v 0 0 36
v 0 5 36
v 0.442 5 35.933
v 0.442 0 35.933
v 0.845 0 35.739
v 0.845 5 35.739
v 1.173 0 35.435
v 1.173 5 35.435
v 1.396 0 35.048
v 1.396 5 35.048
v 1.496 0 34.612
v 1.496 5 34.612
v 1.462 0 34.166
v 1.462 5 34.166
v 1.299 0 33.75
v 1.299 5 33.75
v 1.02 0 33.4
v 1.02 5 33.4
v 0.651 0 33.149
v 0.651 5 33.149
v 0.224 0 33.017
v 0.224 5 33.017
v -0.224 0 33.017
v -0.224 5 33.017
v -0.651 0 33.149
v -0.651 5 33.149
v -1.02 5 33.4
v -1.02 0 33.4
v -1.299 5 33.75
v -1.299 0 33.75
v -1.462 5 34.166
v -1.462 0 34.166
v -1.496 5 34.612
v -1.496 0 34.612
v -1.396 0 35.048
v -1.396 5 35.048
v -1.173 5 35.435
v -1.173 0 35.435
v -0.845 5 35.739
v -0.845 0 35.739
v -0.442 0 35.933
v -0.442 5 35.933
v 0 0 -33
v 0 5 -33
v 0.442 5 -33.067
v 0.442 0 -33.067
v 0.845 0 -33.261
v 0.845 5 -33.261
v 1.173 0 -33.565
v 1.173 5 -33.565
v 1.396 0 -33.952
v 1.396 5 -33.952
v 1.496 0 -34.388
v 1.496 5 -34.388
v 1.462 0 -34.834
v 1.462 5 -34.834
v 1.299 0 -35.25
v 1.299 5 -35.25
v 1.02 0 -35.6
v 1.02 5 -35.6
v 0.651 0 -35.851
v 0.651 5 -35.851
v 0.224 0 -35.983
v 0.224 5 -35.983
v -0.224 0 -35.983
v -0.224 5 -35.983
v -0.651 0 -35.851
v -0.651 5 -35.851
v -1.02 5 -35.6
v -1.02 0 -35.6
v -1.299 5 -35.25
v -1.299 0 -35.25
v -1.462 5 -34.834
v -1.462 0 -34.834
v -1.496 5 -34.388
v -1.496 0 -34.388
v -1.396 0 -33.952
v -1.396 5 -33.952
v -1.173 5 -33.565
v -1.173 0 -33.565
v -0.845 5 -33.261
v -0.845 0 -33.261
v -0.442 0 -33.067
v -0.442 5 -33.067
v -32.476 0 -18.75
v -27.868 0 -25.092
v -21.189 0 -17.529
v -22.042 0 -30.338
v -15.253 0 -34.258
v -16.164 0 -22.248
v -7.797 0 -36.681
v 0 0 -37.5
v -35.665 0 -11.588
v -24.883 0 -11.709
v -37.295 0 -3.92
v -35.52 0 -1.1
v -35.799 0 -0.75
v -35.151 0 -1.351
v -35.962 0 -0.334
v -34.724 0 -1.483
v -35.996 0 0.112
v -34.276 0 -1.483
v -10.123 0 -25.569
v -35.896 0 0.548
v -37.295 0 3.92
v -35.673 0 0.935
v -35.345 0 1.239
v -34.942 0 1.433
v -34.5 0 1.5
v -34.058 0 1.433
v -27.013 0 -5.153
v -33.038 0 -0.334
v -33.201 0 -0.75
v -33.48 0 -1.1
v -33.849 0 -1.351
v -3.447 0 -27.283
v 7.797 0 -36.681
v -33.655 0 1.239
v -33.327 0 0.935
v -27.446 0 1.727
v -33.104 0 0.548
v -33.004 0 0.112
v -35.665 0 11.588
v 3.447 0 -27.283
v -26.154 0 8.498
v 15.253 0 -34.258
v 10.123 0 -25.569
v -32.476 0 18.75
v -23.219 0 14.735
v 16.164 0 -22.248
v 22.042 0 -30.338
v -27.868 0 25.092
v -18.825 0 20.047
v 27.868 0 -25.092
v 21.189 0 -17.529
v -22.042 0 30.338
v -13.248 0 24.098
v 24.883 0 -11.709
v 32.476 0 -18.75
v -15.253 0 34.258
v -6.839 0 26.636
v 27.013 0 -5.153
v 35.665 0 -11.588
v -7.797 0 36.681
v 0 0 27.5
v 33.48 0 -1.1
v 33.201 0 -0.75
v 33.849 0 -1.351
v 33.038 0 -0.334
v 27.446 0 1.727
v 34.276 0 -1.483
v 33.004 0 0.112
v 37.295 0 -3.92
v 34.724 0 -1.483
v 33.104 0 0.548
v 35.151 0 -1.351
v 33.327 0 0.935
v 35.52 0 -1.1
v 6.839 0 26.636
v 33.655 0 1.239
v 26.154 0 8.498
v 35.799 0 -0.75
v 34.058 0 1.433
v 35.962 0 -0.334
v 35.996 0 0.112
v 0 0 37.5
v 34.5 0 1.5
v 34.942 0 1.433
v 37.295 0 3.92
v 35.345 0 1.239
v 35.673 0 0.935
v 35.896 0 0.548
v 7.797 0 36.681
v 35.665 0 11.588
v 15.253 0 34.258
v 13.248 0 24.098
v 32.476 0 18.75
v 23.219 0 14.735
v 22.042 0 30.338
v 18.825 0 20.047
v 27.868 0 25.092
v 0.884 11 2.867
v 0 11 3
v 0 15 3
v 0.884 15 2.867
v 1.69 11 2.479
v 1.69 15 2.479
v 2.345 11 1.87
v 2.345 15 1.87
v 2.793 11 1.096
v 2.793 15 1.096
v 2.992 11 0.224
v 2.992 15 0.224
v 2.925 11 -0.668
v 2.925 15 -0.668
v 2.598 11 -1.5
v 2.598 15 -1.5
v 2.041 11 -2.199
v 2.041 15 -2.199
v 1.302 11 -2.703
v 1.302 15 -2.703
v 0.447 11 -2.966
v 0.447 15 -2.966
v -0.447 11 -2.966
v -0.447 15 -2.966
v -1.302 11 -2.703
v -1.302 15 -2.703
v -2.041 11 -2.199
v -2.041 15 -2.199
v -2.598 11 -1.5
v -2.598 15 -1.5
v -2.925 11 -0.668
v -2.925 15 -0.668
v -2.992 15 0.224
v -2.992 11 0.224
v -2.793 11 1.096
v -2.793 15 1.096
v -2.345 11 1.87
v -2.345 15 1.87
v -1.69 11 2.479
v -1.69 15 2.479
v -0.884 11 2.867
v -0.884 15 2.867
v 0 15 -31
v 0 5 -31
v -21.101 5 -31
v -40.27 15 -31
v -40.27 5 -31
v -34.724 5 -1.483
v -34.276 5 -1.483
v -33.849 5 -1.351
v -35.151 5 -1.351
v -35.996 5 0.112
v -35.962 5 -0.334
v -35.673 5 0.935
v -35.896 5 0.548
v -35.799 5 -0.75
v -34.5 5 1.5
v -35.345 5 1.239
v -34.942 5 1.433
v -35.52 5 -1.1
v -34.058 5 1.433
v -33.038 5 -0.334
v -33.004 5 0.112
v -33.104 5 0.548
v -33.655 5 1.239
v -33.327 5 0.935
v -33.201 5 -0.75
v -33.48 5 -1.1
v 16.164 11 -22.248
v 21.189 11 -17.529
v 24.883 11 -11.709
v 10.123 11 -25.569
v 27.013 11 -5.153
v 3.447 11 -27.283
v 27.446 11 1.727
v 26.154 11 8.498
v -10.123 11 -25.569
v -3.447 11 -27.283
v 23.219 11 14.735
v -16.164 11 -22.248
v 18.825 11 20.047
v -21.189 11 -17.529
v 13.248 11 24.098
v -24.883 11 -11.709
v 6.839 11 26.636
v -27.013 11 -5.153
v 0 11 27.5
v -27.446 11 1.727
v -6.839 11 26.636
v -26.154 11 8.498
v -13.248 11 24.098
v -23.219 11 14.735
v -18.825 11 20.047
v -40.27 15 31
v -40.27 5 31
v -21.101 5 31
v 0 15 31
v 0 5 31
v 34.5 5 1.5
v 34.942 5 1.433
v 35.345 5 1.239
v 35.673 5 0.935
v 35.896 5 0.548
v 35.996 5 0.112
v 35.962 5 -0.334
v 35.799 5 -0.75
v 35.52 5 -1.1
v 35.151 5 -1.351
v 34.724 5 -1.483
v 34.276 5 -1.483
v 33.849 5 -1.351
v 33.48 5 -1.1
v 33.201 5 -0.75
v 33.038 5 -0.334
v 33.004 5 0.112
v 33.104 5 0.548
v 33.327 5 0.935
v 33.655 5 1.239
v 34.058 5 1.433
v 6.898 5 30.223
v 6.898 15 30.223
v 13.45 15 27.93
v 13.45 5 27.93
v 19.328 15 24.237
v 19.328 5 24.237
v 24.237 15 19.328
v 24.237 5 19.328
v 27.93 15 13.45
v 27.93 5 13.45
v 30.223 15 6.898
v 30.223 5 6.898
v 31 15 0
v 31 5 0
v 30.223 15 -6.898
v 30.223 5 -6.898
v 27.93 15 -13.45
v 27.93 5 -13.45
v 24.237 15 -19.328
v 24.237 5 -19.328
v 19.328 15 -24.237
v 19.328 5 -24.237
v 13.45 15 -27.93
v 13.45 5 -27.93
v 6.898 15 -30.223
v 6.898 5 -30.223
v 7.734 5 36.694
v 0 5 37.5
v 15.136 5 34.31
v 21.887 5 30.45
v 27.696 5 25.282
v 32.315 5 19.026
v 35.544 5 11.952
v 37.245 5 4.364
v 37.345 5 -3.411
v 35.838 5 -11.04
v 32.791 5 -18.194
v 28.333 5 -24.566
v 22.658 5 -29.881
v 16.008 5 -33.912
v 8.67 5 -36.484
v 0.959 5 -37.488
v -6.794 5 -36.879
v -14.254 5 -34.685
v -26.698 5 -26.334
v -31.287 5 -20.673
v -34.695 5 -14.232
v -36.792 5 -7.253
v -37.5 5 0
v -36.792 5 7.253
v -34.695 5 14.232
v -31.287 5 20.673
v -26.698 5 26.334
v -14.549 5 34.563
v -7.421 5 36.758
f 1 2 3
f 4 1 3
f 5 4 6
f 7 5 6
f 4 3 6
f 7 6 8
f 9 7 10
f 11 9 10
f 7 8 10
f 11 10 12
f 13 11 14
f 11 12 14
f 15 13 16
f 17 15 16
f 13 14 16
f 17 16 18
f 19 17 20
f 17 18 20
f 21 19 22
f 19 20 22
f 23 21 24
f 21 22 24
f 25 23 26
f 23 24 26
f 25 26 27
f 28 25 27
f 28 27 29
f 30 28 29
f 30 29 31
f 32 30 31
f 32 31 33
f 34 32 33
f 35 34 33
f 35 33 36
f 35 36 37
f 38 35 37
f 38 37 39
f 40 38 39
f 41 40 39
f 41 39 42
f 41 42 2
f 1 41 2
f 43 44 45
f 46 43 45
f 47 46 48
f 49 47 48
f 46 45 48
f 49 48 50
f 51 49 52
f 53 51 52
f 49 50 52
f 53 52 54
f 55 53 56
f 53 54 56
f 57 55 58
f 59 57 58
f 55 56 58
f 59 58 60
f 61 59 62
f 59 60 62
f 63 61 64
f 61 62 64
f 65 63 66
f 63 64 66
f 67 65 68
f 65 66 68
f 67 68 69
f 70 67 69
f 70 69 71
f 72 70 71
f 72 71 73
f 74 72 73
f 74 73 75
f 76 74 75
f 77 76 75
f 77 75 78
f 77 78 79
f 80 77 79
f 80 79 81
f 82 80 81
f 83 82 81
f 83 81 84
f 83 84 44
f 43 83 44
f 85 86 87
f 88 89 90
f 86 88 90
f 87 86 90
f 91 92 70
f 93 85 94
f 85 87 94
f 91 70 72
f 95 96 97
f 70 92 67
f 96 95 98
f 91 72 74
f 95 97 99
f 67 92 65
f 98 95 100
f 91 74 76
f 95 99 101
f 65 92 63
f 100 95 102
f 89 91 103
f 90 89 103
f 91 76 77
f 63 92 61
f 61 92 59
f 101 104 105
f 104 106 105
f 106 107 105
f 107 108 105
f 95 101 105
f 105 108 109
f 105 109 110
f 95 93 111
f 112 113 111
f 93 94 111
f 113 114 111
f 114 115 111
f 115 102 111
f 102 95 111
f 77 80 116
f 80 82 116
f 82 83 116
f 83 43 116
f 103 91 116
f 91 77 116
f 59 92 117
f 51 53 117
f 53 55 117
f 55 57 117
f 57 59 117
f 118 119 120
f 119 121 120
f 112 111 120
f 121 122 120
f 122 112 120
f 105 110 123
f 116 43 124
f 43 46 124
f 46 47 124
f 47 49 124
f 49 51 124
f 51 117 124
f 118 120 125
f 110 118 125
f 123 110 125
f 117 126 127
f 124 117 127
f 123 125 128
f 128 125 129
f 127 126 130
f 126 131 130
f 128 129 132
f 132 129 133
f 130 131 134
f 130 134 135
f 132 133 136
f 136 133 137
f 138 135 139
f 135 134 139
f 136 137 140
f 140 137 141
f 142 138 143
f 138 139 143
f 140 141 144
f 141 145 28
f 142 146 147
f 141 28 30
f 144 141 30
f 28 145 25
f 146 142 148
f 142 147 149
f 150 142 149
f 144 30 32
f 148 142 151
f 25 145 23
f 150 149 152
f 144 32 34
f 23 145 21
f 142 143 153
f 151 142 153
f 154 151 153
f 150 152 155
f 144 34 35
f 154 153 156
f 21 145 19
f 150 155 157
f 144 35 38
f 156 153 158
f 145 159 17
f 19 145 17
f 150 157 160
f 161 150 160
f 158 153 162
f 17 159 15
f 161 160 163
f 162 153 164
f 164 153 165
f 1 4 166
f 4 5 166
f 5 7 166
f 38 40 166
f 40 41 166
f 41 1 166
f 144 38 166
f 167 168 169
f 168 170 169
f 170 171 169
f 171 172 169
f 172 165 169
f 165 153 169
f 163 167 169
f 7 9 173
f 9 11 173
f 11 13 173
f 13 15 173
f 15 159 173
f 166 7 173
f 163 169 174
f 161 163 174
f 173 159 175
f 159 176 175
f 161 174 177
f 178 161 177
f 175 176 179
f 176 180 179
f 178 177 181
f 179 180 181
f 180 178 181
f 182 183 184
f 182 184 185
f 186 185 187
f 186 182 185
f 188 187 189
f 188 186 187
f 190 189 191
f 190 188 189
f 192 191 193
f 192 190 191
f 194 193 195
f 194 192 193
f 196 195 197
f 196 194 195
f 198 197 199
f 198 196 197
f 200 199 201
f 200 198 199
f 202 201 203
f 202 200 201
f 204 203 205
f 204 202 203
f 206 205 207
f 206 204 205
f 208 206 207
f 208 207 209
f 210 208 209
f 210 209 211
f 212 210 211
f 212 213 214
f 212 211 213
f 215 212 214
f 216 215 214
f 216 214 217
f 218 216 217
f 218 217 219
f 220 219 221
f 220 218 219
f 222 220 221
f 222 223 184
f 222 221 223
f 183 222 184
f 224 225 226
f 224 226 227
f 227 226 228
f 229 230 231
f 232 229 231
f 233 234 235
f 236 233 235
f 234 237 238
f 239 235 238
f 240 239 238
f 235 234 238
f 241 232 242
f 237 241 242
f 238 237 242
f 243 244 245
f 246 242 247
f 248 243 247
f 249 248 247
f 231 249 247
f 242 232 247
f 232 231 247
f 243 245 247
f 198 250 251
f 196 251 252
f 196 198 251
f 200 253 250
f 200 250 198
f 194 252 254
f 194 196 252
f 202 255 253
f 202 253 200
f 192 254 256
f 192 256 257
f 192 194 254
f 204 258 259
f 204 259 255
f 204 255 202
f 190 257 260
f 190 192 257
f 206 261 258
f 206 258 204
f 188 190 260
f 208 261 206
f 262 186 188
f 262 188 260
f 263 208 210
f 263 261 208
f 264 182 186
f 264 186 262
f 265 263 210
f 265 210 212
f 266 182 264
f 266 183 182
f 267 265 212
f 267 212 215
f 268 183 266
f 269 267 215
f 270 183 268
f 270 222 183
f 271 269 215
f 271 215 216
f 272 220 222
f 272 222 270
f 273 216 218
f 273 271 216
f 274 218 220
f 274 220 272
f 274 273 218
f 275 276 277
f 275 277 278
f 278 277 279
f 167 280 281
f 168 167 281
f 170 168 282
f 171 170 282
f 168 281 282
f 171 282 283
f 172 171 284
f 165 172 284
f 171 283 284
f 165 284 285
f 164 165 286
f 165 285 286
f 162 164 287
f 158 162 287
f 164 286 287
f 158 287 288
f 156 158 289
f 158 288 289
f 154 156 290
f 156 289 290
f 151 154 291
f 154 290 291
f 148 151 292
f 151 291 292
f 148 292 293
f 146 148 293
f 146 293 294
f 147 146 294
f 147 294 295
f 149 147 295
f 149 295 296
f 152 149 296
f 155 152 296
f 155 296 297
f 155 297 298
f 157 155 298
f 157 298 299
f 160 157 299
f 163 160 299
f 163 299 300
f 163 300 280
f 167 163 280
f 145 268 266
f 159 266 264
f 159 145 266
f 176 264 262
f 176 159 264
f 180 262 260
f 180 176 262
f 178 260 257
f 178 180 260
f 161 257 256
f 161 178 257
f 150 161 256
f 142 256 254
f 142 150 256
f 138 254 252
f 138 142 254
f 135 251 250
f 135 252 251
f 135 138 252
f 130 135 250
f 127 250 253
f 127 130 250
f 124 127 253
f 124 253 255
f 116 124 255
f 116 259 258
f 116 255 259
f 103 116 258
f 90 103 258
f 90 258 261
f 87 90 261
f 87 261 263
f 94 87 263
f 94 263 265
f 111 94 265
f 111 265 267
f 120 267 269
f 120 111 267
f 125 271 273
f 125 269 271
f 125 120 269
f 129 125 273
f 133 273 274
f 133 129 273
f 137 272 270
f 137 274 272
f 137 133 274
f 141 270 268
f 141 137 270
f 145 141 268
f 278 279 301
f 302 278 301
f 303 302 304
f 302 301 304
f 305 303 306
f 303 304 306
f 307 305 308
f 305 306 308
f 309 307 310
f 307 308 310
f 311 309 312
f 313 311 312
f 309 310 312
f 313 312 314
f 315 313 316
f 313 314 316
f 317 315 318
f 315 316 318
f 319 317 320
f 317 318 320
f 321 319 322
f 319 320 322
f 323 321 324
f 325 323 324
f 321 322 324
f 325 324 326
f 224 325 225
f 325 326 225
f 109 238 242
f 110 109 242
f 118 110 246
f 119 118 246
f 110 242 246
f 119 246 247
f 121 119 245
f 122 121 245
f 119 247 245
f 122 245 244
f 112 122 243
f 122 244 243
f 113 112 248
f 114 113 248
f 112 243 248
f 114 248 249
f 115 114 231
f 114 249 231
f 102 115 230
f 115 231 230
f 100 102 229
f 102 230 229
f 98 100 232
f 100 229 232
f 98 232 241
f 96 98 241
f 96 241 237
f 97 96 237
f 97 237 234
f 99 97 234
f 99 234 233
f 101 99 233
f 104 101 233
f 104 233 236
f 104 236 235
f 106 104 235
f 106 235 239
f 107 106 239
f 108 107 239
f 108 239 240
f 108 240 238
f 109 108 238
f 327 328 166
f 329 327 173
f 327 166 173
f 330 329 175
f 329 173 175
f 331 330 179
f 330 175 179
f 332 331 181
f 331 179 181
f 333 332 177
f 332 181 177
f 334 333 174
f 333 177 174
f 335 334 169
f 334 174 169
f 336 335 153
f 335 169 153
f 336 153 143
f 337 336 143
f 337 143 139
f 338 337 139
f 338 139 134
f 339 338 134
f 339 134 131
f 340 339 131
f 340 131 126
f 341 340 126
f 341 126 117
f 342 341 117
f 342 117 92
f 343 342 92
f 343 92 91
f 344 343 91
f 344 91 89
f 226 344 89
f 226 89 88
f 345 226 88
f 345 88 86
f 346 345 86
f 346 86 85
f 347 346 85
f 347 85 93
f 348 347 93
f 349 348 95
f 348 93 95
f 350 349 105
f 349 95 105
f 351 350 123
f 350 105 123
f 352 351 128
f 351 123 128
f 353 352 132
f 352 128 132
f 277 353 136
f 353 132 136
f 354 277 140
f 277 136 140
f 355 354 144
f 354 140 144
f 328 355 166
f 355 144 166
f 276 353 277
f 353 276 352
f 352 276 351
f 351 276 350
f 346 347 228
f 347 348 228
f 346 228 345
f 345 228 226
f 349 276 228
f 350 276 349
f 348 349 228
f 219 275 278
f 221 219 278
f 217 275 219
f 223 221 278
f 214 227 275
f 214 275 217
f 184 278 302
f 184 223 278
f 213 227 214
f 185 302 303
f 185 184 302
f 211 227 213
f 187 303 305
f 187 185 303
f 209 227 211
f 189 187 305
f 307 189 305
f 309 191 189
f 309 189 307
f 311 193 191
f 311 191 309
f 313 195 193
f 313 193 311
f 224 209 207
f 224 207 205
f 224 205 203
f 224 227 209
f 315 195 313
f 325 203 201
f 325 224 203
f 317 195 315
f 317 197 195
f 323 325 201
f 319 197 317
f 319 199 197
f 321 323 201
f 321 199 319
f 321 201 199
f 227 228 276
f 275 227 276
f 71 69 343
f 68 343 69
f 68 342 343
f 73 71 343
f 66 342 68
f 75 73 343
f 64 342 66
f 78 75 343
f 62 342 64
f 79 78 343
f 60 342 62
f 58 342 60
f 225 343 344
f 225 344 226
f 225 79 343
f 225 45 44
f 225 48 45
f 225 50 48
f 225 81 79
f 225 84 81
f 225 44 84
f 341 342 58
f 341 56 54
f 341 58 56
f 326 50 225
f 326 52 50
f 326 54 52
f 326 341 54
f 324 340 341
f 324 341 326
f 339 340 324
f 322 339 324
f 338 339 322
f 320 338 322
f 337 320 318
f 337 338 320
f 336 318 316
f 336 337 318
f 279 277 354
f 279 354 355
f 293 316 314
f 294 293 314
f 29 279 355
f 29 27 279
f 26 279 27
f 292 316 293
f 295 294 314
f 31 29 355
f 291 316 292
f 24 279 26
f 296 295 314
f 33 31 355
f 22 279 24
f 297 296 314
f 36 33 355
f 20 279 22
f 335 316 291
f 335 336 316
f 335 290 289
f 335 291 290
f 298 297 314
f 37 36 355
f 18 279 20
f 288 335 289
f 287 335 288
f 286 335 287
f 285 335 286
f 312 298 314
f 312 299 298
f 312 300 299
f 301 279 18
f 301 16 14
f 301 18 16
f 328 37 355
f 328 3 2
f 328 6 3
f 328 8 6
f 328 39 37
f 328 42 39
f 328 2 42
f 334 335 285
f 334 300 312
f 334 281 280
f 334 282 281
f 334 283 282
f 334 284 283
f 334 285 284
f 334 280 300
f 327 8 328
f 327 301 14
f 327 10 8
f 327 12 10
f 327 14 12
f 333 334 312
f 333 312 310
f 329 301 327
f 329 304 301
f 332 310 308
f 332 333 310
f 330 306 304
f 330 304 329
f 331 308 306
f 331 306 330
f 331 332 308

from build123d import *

# Parameters (mm, degrees)
SKETCH1_R               = 37.5
SKETCH1_R_2             = 27.5
BOSS_EXTRUDE1_DEPTH     = 5
BOSS_EXTRUDE2_DEPTH     = 10
SKETCH3_R               = 27.5
CUT_EXTRUDE2_DEPTH      = 6
CUT_EXTRUDE3_DEPTH      = 58.034295486
CUT_EXTRUDE3_DEPTH_BACK = 58.034295486
SKETCH4_R               = 3
SKETCH5_R               = 1.5
CUT_EXTRUDE4_DEPTH      = 56.927728914


with BuildPart() as part:
    # Sketch1 → Boss-Extrude1 (new body)
    with BuildSketch(Plane(origin=(0, 0, 0), x_dir=(1, 0, 0), z_dir=(0, 1, 0))):
        with Locations(Location((0, 0, 0), (0, 0, 270))):
            Circle(SKETCH1_R)
        with Locations(Location((0, 0, 0), (0, 0, 270))):
            Circle(SKETCH1_R_2, mode=Mode.SUBTRACT)
    extrude(amount=BOSS_EXTRUDE1_DEPTH)

    # Sketch2 → Boss-Extrude2 (add)
    with BuildSketch(Plane(origin=(0, 5, 0), x_dir=(1, 0, 0), z_dir=(0, 1, 0))):
        with BuildLine():
            Line((0, 31), (-40.269850528, 31))
            Line((-40.269850528, 31), (-40.269850528, -31))
            Line((-40.269850528, -31), (0, -31))
            ThreePointArc((0, -31), (31, 0), (0, 31))
        make_face()
    extrude(amount=BOSS_EXTRUDE2_DEPTH)

    # Sketch3 → Cut-Extrude2 (cut)
    with BuildSketch(Plane.XZ.offset(-5)):
        with Locations(Location((0, 0, 0), (0, 0, 90))):
            Circle(SKETCH3_R)
    extrude(amount=-CUT_EXTRUDE2_DEPTH, mode=Mode.SUBTRACT)

    # Sketch4 → Cut-Extrude3 (cut, two sides: drawn at the far end of the back side and taken through both)
    with BuildSketch(Plane(origin=(0, 15, 0), x_dir=(1, 0, 0), z_dir=(0, 1, 0)).offset(-CUT_EXTRUDE3_DEPTH_BACK)):
        with Locations(Location((0, 0, 0), (0, 0, 270))):
            Circle(SKETCH4_R)
    extrude(amount=CUT_EXTRUDE3_DEPTH + CUT_EXTRUDE3_DEPTH_BACK, mode=Mode.SUBTRACT)

    # Sketch5 → Cut-Extrude4 (cut, through all)
    with BuildSketch(Plane(origin=(0, 5, 0), x_dir=(1, 0, 0), z_dir=(0, 1, 0))):
        with Locations(Location((34.5, 0, 0), (0, 0, 270))):
            Circle(SKETCH5_R)
        with Locations(Location((0, -34.5, 0), (0, 0, 270))):
            Circle(SKETCH5_R)
        with Locations(Location((-34.5, 0, 0), (0, 0, 270))):
            Circle(SKETCH5_R)
        with Locations(Location((0, 34.5, 0), (0, 0, 270))):
            Circle(SKETCH5_R)
    extrude(amount=-CUT_EXTRUDE4_DEPTH, mode=Mode.SUBTRACT)


solid = part.part
